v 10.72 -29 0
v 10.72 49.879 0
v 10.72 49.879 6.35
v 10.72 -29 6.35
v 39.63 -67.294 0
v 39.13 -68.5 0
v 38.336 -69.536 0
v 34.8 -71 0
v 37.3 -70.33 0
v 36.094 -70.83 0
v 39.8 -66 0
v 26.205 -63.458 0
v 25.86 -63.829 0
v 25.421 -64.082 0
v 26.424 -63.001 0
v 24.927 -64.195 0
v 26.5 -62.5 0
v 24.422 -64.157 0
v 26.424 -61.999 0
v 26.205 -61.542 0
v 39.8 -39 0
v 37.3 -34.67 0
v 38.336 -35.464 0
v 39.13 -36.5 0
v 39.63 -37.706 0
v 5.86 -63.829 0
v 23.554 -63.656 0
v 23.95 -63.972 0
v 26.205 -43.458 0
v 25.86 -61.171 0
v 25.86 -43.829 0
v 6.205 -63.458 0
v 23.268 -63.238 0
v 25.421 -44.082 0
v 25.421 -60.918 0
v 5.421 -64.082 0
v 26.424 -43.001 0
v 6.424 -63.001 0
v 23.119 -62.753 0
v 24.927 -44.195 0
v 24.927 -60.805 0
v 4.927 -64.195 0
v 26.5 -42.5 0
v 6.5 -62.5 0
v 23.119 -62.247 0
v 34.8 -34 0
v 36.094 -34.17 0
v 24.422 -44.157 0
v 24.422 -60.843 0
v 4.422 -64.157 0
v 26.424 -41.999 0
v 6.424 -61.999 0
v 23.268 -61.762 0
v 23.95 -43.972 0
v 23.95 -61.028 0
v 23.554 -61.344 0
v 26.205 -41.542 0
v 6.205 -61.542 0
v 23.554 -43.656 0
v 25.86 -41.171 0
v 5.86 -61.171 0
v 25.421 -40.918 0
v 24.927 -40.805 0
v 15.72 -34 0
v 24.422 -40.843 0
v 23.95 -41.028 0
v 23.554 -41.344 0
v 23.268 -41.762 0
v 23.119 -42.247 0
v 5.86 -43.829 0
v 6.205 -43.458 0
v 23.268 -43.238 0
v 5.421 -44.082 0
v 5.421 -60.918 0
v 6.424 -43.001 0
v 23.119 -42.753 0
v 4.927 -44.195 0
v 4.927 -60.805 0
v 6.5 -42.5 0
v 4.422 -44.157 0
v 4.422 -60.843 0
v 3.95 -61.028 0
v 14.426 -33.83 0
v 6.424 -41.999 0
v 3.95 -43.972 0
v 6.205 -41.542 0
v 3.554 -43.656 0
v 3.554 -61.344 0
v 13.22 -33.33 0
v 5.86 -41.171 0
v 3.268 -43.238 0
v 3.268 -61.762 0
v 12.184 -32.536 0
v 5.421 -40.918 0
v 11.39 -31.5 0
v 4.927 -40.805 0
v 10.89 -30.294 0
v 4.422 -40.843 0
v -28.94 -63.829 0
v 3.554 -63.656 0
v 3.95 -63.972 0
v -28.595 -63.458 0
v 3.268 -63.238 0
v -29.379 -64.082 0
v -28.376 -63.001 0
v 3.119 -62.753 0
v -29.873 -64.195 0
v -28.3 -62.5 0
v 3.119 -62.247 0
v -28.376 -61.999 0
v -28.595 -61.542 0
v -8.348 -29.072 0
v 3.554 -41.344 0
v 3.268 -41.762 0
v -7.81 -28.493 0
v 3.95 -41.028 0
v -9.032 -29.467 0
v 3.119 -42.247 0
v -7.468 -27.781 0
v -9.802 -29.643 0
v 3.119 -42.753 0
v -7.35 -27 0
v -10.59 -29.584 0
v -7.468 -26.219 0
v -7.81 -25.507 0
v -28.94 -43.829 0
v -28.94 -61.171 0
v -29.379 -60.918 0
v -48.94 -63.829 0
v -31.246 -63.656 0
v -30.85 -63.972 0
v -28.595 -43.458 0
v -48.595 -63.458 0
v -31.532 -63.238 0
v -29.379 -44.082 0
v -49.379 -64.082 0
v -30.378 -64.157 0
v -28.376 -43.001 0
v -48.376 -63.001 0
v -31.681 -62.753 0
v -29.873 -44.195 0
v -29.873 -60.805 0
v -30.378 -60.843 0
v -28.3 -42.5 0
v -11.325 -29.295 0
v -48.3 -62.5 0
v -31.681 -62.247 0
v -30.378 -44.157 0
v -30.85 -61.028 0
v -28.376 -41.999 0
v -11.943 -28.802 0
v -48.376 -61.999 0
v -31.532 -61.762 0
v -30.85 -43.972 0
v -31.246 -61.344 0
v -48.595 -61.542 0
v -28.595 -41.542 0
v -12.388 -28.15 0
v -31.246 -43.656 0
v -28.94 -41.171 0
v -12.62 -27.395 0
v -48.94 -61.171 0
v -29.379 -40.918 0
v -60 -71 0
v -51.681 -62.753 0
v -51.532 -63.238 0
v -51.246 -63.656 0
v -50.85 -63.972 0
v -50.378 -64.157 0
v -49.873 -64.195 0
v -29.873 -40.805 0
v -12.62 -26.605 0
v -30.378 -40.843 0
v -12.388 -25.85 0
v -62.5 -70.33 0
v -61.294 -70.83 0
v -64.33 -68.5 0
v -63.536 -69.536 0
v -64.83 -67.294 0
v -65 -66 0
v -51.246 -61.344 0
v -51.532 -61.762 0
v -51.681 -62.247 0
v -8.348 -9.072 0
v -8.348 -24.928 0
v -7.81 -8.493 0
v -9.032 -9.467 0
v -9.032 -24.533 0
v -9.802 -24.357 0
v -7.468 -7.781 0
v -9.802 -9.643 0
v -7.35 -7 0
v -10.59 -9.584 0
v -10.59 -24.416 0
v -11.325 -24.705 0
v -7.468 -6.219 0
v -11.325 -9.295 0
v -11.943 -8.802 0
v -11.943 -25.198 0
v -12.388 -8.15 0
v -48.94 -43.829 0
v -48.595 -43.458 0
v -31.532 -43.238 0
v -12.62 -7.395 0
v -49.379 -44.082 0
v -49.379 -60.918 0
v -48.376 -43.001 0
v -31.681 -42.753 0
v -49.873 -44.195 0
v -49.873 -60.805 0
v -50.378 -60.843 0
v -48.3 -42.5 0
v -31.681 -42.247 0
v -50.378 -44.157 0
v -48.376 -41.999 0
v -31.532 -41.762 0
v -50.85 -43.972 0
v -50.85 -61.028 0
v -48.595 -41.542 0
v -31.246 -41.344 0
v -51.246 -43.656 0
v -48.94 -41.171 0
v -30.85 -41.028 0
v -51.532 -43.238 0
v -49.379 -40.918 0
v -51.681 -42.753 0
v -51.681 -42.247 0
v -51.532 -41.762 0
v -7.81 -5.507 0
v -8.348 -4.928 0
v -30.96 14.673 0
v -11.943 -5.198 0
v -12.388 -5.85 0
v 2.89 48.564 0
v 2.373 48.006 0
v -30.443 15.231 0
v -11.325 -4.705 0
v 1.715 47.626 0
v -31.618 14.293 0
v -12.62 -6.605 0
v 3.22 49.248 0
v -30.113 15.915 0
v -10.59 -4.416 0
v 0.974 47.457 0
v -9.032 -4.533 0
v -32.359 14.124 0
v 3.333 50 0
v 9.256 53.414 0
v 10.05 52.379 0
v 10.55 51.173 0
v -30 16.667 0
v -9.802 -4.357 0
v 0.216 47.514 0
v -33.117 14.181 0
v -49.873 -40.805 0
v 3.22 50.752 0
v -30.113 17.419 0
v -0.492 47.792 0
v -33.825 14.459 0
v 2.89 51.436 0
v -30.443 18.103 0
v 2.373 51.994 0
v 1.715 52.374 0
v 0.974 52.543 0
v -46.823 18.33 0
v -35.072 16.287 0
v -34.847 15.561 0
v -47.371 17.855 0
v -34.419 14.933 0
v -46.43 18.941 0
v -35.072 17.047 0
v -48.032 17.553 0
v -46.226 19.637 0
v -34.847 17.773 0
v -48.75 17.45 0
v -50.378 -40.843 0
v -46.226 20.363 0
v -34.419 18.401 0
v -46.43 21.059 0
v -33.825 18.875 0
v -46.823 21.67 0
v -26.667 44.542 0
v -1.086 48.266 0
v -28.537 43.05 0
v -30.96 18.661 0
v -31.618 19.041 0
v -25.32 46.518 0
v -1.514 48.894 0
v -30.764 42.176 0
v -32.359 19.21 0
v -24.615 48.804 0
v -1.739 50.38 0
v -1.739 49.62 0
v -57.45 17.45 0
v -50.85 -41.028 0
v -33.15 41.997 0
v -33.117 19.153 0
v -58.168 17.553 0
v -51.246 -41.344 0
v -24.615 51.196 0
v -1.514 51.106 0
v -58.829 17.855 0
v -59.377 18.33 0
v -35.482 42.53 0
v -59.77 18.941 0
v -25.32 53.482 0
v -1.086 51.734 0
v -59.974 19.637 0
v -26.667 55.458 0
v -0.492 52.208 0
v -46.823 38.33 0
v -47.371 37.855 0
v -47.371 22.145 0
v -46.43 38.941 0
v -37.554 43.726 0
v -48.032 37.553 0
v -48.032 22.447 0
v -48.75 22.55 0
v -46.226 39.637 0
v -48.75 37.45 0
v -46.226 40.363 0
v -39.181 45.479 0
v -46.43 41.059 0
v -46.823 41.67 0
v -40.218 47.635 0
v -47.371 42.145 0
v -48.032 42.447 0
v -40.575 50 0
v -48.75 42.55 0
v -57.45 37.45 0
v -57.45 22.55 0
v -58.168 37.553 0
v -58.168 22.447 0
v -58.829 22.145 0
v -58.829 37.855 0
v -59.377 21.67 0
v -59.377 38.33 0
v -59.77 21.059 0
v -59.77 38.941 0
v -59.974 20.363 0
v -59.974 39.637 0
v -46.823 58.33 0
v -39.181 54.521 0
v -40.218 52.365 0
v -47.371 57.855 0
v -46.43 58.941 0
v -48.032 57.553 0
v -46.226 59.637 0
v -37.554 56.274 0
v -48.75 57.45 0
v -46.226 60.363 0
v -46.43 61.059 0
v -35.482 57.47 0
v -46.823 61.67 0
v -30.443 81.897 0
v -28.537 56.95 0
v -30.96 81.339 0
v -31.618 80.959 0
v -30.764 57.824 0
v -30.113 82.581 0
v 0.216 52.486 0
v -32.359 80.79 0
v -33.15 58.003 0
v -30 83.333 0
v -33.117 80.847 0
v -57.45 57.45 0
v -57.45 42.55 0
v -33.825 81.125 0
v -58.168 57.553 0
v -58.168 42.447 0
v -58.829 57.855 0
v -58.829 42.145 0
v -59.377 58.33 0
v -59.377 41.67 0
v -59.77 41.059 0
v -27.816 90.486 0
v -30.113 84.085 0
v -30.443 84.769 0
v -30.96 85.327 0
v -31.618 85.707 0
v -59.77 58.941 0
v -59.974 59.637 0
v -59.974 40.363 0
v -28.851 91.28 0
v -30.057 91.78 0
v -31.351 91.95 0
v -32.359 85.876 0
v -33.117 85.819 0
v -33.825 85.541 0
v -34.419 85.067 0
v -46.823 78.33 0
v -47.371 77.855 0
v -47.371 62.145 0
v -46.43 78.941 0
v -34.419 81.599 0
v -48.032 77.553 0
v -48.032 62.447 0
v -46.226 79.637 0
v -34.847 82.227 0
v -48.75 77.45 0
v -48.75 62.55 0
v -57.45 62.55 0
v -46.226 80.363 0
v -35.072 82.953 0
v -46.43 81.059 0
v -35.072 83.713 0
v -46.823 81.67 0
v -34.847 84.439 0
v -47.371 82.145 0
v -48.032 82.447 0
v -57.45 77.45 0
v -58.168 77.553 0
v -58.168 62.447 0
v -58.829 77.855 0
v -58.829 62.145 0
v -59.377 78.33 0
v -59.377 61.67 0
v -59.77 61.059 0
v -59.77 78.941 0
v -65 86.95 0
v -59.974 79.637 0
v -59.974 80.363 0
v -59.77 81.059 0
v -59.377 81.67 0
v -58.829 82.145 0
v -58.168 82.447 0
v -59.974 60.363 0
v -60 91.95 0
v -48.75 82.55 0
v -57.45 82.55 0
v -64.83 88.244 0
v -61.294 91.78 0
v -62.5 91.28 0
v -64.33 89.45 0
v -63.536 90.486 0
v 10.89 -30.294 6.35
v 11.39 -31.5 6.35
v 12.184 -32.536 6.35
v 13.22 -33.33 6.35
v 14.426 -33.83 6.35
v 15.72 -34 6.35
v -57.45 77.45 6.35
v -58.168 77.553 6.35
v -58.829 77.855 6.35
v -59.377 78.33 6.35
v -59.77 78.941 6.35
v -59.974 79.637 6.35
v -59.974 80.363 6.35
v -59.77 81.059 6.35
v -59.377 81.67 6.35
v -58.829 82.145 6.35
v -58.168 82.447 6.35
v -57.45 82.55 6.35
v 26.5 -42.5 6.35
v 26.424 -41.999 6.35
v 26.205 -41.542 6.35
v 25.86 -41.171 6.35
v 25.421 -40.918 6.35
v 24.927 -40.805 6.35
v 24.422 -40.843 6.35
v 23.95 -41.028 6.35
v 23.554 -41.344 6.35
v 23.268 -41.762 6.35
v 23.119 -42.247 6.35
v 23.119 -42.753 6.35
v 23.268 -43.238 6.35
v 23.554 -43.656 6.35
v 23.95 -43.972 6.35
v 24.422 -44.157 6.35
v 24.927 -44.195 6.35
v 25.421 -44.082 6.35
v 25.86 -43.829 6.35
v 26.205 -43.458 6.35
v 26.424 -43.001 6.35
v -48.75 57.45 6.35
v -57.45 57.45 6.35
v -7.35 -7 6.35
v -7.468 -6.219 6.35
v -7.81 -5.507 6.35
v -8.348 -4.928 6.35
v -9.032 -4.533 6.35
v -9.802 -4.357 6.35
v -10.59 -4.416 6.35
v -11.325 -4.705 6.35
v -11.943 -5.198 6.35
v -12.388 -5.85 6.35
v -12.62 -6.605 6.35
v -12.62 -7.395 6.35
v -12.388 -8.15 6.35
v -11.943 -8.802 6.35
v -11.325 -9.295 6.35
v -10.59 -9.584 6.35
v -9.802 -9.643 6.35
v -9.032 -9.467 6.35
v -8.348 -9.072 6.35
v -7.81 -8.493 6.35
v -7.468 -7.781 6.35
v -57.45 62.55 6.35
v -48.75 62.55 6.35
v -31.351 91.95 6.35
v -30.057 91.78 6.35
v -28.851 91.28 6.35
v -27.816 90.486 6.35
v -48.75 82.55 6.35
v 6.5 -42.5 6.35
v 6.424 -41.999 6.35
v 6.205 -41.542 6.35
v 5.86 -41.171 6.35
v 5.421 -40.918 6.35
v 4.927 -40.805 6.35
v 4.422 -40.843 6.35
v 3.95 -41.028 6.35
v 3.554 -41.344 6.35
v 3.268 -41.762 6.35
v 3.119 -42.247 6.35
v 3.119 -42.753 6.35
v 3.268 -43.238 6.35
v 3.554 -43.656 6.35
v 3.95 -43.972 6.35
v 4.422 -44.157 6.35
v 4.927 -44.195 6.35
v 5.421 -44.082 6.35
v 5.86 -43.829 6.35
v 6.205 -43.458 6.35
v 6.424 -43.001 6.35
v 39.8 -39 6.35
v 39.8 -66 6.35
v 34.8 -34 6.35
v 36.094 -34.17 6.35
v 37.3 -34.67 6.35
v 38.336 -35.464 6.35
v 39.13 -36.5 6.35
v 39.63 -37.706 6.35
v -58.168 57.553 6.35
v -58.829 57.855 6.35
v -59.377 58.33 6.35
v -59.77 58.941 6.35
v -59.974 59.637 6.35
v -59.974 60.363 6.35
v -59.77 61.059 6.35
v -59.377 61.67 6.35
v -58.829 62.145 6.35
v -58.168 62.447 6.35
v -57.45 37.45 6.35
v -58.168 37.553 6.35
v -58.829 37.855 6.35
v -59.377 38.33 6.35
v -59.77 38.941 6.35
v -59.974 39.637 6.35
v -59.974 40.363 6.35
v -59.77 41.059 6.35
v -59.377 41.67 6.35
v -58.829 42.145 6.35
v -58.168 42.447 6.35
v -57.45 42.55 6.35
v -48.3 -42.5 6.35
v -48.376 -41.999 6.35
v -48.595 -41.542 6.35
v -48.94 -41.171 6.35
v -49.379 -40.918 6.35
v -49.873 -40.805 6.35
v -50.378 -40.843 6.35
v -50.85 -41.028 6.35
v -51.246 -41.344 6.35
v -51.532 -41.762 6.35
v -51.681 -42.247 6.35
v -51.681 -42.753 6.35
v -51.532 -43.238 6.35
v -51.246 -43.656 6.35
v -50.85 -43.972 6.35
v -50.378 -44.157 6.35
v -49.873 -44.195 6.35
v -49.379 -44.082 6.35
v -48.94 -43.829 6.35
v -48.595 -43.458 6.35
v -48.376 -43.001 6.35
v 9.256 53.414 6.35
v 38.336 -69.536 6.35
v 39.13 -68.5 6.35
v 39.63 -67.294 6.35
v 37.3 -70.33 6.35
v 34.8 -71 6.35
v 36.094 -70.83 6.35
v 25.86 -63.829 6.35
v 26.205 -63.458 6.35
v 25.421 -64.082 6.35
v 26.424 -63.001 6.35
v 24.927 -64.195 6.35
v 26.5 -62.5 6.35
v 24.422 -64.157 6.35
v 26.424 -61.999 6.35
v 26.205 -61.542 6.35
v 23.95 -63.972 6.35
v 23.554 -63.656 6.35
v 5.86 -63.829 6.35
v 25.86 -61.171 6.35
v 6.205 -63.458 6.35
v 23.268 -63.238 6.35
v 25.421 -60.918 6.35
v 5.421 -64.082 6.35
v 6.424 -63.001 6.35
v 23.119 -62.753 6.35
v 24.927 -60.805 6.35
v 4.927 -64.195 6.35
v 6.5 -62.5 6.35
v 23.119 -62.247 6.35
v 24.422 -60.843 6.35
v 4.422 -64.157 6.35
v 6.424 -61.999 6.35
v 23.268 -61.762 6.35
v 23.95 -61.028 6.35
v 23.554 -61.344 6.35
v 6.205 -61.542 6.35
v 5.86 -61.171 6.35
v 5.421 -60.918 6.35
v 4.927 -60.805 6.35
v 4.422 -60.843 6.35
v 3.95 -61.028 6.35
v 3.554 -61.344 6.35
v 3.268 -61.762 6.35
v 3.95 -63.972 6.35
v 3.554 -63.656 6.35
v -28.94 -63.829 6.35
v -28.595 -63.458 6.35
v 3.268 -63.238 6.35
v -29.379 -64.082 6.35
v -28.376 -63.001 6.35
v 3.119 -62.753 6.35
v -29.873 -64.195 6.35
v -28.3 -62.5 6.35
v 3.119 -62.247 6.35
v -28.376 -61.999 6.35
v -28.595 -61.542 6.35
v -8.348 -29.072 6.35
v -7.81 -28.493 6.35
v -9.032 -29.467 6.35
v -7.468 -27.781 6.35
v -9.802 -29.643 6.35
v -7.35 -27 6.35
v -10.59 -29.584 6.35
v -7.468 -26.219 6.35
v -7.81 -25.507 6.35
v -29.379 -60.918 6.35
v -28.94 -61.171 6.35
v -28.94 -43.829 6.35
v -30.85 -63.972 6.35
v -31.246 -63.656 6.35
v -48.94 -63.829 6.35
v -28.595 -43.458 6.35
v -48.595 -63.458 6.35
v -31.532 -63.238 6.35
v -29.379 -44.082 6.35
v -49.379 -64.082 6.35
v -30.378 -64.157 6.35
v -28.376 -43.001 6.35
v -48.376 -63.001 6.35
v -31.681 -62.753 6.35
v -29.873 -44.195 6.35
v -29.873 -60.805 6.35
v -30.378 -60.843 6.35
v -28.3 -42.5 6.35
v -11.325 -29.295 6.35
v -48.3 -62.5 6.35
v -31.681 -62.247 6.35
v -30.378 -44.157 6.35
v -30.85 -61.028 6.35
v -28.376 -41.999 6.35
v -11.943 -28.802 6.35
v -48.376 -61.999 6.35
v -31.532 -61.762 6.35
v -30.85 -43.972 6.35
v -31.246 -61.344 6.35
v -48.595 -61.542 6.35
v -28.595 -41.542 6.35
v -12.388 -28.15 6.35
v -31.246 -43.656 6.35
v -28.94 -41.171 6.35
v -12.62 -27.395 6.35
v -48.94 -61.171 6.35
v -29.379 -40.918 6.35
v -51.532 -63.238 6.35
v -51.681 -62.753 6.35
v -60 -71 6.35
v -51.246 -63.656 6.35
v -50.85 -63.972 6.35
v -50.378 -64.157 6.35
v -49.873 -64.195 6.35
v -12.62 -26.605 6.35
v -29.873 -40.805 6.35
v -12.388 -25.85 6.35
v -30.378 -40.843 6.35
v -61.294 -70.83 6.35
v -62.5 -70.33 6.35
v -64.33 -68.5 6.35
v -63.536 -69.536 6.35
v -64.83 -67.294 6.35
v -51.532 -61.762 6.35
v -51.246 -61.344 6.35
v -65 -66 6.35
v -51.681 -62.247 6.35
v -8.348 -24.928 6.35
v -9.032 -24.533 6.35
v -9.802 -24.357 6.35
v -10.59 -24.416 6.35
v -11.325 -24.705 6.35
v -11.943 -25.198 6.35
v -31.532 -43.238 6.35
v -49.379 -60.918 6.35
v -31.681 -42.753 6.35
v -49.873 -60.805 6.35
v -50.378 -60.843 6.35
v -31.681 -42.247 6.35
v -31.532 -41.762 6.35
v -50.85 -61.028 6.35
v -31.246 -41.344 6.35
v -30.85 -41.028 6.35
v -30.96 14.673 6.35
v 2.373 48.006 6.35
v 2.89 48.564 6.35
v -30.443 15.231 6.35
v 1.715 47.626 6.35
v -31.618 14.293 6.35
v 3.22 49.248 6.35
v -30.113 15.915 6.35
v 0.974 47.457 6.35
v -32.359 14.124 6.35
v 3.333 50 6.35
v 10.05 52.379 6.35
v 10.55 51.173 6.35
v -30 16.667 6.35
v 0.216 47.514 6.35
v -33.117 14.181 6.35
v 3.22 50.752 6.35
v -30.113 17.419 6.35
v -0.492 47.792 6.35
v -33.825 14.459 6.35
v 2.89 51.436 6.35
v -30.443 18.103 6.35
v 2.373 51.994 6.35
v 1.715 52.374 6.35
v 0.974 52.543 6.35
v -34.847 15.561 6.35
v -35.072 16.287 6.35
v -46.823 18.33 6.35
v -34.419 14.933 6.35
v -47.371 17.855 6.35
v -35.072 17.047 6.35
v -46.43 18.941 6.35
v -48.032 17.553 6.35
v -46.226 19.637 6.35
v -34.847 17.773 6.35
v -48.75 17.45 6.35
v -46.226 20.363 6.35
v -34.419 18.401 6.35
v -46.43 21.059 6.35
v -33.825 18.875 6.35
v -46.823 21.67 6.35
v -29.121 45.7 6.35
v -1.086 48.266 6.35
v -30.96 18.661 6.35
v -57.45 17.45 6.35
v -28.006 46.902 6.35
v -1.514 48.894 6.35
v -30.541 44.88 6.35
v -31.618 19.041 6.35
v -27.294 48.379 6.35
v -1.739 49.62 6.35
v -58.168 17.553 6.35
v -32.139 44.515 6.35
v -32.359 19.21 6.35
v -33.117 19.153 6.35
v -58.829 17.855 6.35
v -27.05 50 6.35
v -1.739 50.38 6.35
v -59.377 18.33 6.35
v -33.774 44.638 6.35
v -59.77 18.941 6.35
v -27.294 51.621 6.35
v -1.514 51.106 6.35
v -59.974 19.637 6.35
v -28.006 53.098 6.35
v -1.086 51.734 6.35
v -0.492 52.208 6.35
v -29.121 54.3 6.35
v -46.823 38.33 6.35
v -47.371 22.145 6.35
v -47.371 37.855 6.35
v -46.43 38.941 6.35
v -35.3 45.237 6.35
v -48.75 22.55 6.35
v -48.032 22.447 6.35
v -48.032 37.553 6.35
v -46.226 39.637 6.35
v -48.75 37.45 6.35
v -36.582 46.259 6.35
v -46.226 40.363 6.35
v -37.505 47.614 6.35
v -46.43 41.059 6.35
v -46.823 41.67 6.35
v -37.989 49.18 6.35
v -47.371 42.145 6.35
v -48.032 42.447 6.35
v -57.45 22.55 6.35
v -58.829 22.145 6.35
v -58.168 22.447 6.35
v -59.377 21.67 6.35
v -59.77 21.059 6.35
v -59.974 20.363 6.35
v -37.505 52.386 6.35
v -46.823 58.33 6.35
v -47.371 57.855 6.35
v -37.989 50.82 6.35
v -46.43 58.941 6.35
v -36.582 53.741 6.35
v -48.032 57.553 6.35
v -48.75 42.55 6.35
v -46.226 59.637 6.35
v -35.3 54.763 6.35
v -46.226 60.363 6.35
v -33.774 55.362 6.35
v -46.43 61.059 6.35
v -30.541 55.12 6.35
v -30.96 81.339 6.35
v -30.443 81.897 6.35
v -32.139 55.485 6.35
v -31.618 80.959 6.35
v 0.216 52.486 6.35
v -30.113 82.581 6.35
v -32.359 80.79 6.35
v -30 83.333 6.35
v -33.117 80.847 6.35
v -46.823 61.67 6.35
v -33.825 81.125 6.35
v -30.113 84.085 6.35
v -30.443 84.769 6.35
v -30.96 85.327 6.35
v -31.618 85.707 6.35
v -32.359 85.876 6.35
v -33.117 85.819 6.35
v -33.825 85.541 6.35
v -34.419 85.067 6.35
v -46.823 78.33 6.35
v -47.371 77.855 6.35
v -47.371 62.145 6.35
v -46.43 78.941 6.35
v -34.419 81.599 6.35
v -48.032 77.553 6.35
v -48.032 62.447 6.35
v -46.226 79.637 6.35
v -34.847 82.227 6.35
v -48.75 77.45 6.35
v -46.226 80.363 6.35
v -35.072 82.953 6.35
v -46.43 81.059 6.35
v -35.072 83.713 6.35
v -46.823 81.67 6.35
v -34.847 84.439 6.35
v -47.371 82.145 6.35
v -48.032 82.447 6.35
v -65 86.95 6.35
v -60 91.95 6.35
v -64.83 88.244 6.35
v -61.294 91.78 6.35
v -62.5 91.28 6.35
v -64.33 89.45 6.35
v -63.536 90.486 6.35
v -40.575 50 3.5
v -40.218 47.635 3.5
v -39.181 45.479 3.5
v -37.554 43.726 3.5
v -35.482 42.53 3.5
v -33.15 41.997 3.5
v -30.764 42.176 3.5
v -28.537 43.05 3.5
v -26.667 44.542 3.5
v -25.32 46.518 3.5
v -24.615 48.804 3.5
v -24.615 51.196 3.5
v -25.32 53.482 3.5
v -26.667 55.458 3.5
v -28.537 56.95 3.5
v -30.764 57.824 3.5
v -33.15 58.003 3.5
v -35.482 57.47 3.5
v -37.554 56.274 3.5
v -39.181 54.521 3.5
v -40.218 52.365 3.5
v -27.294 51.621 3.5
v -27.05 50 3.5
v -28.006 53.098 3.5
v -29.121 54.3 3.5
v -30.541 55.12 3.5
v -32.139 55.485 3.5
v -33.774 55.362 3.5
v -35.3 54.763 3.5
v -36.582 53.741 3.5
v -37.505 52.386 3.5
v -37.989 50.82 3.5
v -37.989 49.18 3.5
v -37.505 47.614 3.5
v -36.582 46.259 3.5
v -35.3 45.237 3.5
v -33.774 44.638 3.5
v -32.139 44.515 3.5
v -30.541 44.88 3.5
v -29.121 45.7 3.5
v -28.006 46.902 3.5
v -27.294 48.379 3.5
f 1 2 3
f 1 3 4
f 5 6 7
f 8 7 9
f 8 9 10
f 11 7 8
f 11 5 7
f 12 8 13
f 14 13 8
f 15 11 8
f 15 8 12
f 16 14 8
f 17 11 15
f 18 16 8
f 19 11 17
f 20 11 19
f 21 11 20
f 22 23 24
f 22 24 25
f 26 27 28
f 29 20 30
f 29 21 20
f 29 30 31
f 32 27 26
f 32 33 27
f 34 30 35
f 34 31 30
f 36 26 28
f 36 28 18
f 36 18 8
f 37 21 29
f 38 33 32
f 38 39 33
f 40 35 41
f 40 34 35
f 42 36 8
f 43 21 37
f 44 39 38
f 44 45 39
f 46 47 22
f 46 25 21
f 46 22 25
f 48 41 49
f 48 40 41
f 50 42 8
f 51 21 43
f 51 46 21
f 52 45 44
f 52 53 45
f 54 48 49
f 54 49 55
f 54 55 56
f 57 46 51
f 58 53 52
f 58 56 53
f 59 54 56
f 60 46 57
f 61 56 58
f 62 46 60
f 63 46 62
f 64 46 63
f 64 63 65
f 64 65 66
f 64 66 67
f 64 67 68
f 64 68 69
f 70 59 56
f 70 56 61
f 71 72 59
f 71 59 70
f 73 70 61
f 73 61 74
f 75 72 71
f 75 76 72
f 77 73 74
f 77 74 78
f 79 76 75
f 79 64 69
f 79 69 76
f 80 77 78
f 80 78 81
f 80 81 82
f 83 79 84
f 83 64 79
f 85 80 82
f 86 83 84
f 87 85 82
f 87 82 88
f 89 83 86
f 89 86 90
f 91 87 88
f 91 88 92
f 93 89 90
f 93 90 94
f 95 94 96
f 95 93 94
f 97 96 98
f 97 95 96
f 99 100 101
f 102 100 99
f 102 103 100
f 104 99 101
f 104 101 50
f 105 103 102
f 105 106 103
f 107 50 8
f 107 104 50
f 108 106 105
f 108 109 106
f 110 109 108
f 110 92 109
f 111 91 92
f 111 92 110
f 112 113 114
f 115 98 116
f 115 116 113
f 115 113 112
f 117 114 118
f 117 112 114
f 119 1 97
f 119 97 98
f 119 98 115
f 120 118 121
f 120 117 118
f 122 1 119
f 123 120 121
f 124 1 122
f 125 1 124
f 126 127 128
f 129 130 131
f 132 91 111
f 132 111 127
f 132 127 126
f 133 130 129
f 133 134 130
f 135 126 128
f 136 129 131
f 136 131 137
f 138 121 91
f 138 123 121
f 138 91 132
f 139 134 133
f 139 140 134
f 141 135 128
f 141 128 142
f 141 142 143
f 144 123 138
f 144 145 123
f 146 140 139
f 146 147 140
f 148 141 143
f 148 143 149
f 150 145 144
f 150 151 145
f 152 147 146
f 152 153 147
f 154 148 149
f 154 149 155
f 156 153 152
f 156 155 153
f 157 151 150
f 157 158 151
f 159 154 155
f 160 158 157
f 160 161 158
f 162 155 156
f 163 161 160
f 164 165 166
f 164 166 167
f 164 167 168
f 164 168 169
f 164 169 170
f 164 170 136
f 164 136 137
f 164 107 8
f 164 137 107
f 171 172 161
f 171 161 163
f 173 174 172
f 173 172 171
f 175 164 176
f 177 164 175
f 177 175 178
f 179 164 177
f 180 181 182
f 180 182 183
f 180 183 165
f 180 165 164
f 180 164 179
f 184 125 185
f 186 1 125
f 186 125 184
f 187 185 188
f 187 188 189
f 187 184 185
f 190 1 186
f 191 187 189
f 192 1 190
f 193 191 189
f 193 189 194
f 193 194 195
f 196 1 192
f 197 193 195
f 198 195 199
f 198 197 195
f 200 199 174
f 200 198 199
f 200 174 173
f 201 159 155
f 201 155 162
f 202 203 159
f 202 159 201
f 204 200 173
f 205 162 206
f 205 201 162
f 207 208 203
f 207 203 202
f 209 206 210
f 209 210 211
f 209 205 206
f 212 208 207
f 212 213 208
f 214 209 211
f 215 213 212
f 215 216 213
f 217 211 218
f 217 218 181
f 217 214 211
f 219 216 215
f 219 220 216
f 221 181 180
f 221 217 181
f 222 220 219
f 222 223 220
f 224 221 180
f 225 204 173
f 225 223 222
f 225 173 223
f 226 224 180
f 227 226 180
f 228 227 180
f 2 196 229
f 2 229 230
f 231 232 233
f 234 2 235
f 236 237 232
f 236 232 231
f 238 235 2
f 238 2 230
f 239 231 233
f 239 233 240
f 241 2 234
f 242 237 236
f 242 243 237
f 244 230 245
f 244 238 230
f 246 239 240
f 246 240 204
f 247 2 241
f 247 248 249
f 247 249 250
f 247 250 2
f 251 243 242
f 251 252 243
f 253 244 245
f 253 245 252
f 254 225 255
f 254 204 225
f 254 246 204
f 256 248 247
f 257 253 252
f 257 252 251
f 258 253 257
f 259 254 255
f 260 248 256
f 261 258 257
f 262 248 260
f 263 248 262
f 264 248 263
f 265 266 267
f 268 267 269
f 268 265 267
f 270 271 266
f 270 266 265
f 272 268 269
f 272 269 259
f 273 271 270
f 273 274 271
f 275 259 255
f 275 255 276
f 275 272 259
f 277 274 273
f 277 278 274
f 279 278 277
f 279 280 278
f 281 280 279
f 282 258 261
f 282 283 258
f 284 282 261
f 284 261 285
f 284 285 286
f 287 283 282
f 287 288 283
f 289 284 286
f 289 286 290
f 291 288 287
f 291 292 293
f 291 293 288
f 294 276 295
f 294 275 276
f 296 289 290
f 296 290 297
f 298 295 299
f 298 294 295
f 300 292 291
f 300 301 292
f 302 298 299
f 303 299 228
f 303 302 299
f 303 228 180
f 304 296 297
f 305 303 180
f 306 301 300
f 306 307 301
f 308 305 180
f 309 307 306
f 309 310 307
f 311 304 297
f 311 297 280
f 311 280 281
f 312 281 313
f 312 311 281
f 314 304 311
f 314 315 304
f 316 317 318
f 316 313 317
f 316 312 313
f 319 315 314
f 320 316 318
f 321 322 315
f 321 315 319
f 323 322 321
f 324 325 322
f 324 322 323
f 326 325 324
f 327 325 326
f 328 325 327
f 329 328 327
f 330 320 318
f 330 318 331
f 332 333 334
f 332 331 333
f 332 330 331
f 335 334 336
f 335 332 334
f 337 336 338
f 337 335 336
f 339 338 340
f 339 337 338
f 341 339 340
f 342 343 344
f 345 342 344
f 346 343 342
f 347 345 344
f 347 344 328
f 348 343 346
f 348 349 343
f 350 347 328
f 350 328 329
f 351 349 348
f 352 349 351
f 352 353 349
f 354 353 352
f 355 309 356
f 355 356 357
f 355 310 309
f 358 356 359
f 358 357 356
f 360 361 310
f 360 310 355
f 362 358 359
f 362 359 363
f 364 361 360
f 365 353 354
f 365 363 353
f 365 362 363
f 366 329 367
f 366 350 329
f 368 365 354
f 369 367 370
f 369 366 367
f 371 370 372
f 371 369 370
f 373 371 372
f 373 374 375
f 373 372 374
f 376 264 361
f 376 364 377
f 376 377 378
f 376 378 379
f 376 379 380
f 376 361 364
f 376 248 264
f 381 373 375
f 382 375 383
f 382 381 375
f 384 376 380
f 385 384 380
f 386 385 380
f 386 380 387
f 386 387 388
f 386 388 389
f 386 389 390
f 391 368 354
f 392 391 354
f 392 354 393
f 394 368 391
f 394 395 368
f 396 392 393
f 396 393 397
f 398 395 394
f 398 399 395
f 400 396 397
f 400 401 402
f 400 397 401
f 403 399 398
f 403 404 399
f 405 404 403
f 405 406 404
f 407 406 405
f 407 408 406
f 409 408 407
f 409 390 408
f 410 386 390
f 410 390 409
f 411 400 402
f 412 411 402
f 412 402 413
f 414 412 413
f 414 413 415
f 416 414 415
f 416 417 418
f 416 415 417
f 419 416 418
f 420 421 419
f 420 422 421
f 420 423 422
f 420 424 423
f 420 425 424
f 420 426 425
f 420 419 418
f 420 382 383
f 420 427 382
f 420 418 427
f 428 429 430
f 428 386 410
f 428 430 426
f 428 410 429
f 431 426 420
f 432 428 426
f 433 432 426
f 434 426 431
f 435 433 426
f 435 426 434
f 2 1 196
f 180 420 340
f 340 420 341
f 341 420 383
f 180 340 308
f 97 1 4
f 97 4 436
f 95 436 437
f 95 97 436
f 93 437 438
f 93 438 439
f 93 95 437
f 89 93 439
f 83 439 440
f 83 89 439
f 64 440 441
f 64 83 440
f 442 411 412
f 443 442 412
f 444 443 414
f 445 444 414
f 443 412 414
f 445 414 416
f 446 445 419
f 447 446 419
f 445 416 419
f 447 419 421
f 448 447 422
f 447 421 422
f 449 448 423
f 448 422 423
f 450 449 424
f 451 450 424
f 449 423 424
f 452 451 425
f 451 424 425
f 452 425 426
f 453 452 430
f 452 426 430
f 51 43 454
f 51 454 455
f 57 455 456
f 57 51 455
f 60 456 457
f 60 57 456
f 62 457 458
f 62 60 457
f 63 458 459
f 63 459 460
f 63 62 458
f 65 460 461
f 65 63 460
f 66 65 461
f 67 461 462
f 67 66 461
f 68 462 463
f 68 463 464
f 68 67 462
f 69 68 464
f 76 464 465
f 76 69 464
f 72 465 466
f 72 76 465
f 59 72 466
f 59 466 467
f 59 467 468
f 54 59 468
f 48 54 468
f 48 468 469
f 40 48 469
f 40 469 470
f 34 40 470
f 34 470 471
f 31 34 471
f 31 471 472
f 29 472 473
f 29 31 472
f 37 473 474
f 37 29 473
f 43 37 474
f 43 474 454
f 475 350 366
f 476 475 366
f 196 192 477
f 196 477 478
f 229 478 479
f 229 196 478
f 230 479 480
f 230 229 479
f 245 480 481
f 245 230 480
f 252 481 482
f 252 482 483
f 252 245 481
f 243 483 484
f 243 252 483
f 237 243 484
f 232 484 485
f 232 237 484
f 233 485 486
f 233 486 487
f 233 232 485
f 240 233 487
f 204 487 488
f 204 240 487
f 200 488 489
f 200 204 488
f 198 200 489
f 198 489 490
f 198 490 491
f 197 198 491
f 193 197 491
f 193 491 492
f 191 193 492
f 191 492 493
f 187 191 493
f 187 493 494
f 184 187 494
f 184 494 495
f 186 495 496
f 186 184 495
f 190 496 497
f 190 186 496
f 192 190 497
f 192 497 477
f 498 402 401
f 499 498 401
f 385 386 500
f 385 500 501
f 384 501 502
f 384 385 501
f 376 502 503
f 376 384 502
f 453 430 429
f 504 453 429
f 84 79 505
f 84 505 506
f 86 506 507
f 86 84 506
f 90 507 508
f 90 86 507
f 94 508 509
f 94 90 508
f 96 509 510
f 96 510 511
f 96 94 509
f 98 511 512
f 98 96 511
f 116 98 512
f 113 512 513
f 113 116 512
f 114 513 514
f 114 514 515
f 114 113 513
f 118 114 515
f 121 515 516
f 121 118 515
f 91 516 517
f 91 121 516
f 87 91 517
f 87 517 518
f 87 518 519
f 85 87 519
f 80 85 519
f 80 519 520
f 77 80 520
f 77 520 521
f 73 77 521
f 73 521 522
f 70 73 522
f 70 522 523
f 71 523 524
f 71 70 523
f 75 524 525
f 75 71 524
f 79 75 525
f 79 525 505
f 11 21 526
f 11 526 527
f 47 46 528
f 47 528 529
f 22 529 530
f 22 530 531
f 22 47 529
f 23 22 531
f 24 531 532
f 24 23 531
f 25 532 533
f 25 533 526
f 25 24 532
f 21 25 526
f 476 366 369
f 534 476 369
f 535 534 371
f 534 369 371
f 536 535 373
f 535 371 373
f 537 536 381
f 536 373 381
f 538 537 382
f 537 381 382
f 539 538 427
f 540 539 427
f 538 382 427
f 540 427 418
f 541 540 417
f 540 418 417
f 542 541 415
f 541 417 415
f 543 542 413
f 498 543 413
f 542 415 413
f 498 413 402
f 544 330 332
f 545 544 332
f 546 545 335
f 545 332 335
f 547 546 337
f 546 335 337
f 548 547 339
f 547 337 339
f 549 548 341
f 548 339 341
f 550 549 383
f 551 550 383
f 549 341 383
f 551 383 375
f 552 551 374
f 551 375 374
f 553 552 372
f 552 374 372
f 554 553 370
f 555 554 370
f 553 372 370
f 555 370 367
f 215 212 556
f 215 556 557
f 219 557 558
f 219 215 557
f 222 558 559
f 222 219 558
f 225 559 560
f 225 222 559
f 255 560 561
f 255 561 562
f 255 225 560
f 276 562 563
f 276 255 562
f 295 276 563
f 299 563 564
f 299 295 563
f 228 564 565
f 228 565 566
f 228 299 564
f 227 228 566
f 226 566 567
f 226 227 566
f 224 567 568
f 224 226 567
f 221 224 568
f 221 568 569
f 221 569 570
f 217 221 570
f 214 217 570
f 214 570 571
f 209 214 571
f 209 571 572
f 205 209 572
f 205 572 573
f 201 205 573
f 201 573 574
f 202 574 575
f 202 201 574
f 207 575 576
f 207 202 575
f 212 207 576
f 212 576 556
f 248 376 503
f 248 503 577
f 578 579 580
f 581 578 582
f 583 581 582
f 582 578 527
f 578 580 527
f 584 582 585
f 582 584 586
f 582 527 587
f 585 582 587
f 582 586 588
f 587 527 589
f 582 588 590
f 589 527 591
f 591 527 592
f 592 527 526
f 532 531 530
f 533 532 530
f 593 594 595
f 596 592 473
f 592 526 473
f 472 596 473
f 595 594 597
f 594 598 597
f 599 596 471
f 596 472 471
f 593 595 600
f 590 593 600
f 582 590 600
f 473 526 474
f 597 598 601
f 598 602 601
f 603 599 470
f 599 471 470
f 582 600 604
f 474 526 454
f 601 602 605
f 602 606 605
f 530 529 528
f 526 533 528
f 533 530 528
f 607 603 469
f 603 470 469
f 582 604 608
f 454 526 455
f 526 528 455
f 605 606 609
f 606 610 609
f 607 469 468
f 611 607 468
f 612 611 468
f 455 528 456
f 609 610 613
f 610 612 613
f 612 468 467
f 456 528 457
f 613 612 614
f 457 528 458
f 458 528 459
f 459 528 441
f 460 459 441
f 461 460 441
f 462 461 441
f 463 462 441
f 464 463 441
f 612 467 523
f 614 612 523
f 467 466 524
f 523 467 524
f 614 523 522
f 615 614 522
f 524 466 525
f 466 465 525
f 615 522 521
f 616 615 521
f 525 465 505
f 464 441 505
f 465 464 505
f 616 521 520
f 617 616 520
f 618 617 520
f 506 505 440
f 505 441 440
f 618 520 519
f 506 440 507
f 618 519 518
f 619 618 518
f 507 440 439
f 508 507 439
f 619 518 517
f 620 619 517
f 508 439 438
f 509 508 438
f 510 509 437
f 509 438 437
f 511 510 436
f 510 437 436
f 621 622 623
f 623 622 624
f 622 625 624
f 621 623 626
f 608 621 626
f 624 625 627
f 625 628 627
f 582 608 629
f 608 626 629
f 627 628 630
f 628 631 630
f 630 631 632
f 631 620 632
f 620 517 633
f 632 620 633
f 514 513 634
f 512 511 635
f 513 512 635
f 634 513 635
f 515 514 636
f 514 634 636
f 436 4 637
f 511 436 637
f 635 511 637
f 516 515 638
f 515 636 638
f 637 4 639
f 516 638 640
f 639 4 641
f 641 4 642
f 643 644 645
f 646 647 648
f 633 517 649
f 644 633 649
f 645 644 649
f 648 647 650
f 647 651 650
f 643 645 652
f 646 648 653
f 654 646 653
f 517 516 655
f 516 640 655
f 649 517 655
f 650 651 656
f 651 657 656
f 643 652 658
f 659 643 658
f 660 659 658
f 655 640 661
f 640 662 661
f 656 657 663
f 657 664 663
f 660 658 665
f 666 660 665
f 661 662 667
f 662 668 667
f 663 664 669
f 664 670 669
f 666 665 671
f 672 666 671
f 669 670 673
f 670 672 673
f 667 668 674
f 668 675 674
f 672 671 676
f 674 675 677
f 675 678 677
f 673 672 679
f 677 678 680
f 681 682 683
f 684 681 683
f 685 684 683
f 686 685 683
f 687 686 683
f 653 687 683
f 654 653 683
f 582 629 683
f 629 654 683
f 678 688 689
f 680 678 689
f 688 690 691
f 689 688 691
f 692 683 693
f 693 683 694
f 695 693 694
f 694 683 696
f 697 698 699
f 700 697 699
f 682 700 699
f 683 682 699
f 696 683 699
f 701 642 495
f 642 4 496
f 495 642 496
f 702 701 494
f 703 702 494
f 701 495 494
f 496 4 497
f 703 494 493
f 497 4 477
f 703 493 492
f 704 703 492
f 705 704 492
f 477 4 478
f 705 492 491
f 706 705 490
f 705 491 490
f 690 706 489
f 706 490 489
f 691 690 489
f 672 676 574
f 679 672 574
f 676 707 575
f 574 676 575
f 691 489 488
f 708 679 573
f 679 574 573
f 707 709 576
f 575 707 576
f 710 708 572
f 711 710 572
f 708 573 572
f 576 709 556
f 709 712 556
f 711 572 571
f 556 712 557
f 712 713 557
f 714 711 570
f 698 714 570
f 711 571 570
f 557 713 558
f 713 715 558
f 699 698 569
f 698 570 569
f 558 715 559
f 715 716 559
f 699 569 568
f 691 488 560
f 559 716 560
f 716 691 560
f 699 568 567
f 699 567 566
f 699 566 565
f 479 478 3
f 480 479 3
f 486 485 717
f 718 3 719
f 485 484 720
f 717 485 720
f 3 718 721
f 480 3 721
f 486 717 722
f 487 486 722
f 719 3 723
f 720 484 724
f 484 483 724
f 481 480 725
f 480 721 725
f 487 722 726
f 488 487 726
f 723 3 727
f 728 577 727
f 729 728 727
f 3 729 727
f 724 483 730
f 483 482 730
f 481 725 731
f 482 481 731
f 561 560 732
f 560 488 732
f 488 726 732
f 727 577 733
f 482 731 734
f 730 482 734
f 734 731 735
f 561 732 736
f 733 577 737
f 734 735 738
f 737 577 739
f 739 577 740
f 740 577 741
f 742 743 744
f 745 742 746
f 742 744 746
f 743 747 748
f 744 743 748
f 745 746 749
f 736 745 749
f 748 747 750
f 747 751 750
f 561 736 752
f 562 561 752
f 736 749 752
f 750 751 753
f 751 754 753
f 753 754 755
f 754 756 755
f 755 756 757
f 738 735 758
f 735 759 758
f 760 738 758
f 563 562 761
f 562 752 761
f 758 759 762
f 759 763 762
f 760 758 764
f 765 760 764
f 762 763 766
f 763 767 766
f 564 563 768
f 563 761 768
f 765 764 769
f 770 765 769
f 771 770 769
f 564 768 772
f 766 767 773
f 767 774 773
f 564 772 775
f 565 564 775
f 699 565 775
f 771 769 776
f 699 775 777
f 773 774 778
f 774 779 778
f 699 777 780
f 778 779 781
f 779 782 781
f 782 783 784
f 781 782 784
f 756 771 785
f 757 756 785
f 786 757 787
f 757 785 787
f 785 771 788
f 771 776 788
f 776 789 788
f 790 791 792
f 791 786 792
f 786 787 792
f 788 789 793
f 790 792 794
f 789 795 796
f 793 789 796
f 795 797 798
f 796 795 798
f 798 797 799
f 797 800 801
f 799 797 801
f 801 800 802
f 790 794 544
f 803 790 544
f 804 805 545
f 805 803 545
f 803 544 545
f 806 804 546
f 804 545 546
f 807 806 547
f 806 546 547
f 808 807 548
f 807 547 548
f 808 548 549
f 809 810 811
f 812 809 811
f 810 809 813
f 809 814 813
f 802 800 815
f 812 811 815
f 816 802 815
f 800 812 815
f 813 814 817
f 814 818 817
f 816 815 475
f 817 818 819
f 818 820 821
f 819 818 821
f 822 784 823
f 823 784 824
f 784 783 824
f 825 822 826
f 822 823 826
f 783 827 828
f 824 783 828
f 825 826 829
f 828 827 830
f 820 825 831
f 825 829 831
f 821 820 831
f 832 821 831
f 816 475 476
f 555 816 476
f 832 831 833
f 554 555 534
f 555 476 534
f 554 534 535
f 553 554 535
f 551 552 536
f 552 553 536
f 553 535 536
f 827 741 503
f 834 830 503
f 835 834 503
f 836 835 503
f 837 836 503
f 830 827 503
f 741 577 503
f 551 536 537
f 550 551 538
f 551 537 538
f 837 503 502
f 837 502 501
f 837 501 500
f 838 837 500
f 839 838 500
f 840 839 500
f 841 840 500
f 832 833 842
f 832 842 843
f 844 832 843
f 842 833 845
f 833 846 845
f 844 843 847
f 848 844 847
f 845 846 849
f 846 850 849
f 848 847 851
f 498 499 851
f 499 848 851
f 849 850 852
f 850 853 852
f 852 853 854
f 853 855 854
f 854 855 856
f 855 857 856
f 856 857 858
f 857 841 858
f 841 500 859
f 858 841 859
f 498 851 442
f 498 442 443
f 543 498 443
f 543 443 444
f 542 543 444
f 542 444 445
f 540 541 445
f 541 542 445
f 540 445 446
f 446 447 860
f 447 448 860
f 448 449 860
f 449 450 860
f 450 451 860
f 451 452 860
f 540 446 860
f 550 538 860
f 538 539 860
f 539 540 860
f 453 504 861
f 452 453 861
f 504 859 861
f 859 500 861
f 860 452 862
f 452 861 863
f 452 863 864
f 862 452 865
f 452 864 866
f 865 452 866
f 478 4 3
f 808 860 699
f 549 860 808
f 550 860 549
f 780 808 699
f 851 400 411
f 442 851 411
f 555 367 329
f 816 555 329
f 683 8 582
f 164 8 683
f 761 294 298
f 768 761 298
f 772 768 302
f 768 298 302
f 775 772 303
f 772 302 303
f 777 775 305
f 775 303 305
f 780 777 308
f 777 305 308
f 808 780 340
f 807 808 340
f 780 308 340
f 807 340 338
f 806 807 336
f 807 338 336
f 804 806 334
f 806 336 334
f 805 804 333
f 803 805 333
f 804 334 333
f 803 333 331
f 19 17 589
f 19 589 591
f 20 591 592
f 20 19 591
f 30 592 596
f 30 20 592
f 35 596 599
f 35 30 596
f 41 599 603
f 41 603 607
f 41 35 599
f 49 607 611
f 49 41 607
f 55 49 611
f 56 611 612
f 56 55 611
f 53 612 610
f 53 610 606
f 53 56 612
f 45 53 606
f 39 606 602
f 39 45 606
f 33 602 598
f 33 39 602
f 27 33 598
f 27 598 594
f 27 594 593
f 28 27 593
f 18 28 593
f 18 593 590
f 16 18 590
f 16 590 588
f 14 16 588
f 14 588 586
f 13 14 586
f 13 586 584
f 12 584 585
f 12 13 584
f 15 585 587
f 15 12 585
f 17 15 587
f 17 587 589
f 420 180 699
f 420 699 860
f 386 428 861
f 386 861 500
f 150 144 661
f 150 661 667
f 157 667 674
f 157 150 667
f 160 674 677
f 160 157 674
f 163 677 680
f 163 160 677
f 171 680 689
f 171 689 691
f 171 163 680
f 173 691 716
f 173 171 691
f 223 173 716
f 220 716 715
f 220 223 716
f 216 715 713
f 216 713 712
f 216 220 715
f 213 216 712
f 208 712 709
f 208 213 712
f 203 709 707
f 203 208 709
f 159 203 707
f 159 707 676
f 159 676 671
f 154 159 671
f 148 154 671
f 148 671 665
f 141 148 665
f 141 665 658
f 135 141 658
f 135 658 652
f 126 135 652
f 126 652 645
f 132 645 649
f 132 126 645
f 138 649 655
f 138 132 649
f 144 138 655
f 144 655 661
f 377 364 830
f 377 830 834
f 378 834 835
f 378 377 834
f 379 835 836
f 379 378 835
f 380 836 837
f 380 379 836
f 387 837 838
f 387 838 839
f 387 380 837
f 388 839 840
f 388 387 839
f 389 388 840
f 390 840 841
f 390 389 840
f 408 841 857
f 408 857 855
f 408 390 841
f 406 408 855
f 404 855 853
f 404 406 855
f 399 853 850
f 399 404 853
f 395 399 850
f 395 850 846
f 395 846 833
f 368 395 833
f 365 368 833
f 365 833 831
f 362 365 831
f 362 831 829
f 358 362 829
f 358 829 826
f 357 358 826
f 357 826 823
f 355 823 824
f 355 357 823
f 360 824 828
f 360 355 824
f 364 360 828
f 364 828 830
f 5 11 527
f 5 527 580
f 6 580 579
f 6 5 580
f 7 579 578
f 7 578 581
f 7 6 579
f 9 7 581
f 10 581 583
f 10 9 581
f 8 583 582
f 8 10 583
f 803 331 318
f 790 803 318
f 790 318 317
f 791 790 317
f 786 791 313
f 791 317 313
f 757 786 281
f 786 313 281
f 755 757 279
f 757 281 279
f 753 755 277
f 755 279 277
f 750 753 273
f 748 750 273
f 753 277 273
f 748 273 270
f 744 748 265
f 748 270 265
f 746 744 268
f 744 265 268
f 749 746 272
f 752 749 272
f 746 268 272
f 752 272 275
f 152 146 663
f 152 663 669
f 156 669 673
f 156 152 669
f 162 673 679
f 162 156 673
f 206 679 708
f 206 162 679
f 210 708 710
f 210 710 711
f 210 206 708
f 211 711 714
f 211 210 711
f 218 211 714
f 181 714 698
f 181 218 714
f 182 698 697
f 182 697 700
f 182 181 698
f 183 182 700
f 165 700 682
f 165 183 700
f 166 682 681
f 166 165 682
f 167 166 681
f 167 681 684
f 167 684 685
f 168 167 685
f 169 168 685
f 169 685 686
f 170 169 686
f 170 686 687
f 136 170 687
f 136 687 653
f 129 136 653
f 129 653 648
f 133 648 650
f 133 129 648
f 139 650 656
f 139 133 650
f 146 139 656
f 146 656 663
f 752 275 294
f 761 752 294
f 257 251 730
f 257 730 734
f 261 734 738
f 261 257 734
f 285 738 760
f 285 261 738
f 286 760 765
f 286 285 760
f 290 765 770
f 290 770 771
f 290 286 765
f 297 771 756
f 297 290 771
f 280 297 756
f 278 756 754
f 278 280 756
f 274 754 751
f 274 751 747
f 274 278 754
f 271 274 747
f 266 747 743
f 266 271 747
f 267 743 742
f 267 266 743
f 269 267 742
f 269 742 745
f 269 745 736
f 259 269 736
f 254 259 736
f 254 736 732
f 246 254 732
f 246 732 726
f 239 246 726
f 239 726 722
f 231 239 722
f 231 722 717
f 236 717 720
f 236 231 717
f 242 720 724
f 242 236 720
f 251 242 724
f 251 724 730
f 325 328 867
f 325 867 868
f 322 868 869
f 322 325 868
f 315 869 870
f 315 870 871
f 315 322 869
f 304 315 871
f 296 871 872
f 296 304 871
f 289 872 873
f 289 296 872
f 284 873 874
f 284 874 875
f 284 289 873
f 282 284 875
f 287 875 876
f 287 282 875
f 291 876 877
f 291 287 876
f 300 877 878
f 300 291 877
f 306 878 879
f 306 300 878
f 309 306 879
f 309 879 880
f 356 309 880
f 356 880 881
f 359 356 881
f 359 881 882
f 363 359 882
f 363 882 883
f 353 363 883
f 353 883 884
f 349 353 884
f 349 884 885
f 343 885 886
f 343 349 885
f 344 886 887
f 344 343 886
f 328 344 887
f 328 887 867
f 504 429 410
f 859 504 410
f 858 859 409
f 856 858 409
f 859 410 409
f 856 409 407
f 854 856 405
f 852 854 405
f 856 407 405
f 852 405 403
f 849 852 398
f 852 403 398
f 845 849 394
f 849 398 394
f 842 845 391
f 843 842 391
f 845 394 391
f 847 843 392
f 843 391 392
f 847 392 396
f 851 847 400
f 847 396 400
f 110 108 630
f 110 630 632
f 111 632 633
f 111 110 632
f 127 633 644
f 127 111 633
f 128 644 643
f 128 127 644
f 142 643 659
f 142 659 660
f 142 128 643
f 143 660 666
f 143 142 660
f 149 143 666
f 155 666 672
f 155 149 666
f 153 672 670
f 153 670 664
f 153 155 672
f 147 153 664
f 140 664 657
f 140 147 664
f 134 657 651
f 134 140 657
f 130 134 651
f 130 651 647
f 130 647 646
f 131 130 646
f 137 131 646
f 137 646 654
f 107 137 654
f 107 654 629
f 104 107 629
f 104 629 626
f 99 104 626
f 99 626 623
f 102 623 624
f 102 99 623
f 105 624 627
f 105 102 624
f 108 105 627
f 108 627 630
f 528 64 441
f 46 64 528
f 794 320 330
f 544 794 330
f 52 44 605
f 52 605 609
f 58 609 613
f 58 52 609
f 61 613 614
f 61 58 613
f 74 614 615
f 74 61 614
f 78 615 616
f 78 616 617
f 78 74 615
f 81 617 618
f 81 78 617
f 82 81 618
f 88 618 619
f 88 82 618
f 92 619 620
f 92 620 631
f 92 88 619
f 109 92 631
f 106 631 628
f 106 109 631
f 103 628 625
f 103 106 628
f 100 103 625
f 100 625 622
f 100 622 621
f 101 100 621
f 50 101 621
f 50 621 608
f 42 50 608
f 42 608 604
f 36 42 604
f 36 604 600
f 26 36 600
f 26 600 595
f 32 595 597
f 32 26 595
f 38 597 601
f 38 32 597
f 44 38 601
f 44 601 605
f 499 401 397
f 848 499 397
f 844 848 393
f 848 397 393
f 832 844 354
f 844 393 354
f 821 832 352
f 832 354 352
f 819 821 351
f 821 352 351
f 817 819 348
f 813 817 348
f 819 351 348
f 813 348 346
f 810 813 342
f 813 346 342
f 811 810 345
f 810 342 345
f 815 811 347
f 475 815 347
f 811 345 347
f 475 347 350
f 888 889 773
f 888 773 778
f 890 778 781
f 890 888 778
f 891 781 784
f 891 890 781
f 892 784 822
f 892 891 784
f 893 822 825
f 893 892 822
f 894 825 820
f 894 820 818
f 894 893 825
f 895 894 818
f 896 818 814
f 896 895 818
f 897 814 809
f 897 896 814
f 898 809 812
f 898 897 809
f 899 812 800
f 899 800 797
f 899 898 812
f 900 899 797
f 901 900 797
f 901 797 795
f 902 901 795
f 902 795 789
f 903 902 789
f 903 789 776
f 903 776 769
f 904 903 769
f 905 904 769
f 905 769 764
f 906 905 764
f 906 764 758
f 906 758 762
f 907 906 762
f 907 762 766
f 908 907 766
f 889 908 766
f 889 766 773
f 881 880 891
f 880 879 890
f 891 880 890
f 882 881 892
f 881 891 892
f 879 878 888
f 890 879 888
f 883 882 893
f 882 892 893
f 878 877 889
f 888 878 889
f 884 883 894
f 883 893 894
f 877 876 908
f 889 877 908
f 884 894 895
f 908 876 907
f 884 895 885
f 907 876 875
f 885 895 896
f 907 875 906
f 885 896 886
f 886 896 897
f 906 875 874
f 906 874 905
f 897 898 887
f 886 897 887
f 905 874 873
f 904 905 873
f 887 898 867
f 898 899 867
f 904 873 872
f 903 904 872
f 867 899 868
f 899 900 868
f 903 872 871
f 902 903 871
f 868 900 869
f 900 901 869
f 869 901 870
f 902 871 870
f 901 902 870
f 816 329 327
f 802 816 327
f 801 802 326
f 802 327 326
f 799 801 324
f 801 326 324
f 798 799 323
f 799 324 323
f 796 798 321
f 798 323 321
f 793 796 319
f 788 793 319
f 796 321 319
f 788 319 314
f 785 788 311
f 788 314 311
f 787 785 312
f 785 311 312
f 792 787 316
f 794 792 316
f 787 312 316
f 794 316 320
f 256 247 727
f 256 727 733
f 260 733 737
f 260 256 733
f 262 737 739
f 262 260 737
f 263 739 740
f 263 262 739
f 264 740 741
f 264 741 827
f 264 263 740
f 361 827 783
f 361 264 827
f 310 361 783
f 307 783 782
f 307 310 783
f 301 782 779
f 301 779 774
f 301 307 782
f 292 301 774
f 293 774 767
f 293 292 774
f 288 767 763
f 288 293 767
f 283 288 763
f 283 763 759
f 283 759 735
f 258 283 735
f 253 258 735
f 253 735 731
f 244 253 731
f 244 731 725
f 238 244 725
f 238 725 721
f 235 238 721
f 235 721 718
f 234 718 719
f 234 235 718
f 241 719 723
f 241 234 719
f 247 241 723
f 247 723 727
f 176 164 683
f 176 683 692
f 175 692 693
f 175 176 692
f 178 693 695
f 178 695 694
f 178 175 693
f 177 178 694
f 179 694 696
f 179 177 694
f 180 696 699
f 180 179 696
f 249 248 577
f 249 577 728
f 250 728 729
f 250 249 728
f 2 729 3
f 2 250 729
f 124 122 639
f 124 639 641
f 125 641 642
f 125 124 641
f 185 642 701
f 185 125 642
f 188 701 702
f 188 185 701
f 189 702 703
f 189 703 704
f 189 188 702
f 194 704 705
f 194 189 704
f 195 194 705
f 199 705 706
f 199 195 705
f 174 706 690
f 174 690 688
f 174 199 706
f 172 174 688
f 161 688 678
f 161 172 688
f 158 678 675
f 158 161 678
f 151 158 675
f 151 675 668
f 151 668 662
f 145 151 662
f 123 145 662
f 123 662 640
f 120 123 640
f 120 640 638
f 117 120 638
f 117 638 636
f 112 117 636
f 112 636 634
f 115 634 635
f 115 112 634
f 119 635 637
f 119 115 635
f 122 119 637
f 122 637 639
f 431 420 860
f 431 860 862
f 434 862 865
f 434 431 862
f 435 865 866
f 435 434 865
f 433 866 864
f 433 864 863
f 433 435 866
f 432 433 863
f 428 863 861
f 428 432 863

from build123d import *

# Parameters (mm, degrees)
CROQUIS1_R          = 1.7
CROQUIS1_R_2        = 2.65
CROQUIS1_R_3        = 5.5
CROQUIS1_R_4        = 2.55
EXTRUDE_1_DEPTH     = 6.35
EXTRUDE_START       = -6.35
CROQUIS2_R          = 8.025
EXTRUDE_CUT_1_DEPTH = 3.5


with BuildPart() as part:
    # Croquis1 → Extrude 1 (new body)
    with BuildSketch(Plane.XY):
        with BuildLine():
            Line((-65, -34), (-65, 86.95))
            ThreePointArc((-65, 86.95), (-63.535533906, 90.485533906), (-60, 91.95))
            Line((-60, 91.95), (-31.351067812, 91.95))
            ThreePointArc((-31.351067812, 91.95), (-29.43765065, 91.569397663), (-27.815533906, 90.485533906))
            Line((-27.815533906, 90.485533906), (9.255533906, 53.414466094))
            ThreePointArc((9.255533906, 53.414466094), (10.339397663, 51.79234935), (10.72, 49.878932188))
            Line((10.72, 49.878932188), (10.72, -29))
            ThreePointArc((10.72, -29), (12.184466094, -32.535533906), (15.72, -34))
            Line((15.72, -34), (34.8, -34))
            ThreePointArc((34.8, -34), (38.335533906, -35.464466094), (39.8, -39))
            Line((39.8, -39), (39.8, -66))
            ThreePointArc((39.8, -66), (38.335533906, -69.535533906), (34.8, -71))
            Line((34.8, -71), (-60, -71))
            ThreePointArc((-60, -71), (-63.535533906, -69.535533906), (-65, -66))
            Line((-65, -66), (-65, -34))
        make_face()
        with Locations((-50, -42.5)):
            Circle(CROQUIS1_R, mode=Mode.SUBTRACT)
        with Locations((-30, -42.5)):
            Circle(CROQUIS1_R, mode=Mode.SUBTRACT)
        with Locations((-30, -62.5)):
            Circle(CROQUIS1_R, mode=Mode.SUBTRACT)
        with Locations((-50, -62.5)):
            Circle(CROQUIS1_R, mode=Mode.SUBTRACT)
        with Locations((4.8, -62.5)):
            Circle(CROQUIS1_R, mode=Mode.SUBTRACT)
        with Locations((4.8, -42.5)):
            Circle(CROQUIS1_R, mode=Mode.SUBTRACT)
        with Locations((24.8, -42.5)):
            Circle(CROQUIS1_R, mode=Mode.SUBTRACT)
        with Locations((24.8, -62.5)):
            Circle(CROQUIS1_R, mode=Mode.SUBTRACT)
        with Locations((-10, -7)):
            Circle(CROQUIS1_R_2, mode=Mode.SUBTRACT)
        with Locations((-10, -27)):
            Circle(CROQUIS1_R_2, mode=Mode.SUBTRACT)
        with Locations((-32.55, 50)):
            Circle(CROQUIS1_R_3, mode=Mode.SUBTRACT)
        with Locations((-32.55, 16.666986335)):
            Circle(CROQUIS1_R_4, mode=Mode.SUBTRACT)
        with Locations((-32.55, 83.333013665)):
            Circle(CROQUIS1_R_4, mode=Mode.SUBTRACT)
        with Locations((0.783013665, 50)):
            Circle(CROQUIS1_R_4, mode=Mode.SUBTRACT)
        with BuildLine():
            Line((-57.45, 22.55), (-48.75, 22.55))
            ThreePointArc((-48.75, 22.55), (-46.2, 20), (-48.75, 17.45))
            Line((-48.75, 17.45), (-57.45, 17.45))
            ThreePointArc((-57.45, 17.45), (-60, 20), (-57.45, 22.55))
        make_face(mode=Mode.SUBTRACT)
        with BuildLine():
            Line((-57.45, 82.55), (-48.75, 82.55))
            ThreePointArc((-48.75, 82.55), (-46.2, 80), (-48.75, 77.45))
            Line((-48.75, 77.45), (-57.45, 77.45))
            ThreePointArc((-57.45, 77.45), (-60, 80), (-57.45, 82.55))
        make_face(mode=Mode.SUBTRACT)
        with BuildLine():
            Line((-57.45, 62.55), (-48.75, 62.55))
            ThreePointArc((-48.75, 62.55), (-46.2, 60), (-48.75, 57.45))
            Line((-48.75, 57.45), (-57.45, 57.45))
            ThreePointArc((-57.45, 57.45), (-60, 60), (-57.45, 62.55))
        make_face(mode=Mode.SUBTRACT)
        with BuildLine():
            Line((-57.45, 42.55), (-48.75, 42.55))
            ThreePointArc((-48.75, 42.55), (-46.2, 40), (-48.75, 37.45))
            Line((-48.75, 37.45), (-57.45, 37.45))
            ThreePointArc((-57.45, 37.45), (-60, 40), (-57.45, 42.55))
        make_face(mode=Mode.SUBTRACT)
    extrude(amount=EXTRUDE_1_DEPTH)

    # Croquis2 → Extrude Cut 1 (cut)
    with BuildSketch(Plane.XY.offset(6.35).offset(EXTRUDE_START)):
        with Locations(Location((-32.55, 50, 0), (0, 0, 180))):
            Circle(CROQUIS2_R)
    extrude(amount=EXTRUDE_CUT_1_DEPTH, mode=Mode.SUBTRACT)


solid = part.part
